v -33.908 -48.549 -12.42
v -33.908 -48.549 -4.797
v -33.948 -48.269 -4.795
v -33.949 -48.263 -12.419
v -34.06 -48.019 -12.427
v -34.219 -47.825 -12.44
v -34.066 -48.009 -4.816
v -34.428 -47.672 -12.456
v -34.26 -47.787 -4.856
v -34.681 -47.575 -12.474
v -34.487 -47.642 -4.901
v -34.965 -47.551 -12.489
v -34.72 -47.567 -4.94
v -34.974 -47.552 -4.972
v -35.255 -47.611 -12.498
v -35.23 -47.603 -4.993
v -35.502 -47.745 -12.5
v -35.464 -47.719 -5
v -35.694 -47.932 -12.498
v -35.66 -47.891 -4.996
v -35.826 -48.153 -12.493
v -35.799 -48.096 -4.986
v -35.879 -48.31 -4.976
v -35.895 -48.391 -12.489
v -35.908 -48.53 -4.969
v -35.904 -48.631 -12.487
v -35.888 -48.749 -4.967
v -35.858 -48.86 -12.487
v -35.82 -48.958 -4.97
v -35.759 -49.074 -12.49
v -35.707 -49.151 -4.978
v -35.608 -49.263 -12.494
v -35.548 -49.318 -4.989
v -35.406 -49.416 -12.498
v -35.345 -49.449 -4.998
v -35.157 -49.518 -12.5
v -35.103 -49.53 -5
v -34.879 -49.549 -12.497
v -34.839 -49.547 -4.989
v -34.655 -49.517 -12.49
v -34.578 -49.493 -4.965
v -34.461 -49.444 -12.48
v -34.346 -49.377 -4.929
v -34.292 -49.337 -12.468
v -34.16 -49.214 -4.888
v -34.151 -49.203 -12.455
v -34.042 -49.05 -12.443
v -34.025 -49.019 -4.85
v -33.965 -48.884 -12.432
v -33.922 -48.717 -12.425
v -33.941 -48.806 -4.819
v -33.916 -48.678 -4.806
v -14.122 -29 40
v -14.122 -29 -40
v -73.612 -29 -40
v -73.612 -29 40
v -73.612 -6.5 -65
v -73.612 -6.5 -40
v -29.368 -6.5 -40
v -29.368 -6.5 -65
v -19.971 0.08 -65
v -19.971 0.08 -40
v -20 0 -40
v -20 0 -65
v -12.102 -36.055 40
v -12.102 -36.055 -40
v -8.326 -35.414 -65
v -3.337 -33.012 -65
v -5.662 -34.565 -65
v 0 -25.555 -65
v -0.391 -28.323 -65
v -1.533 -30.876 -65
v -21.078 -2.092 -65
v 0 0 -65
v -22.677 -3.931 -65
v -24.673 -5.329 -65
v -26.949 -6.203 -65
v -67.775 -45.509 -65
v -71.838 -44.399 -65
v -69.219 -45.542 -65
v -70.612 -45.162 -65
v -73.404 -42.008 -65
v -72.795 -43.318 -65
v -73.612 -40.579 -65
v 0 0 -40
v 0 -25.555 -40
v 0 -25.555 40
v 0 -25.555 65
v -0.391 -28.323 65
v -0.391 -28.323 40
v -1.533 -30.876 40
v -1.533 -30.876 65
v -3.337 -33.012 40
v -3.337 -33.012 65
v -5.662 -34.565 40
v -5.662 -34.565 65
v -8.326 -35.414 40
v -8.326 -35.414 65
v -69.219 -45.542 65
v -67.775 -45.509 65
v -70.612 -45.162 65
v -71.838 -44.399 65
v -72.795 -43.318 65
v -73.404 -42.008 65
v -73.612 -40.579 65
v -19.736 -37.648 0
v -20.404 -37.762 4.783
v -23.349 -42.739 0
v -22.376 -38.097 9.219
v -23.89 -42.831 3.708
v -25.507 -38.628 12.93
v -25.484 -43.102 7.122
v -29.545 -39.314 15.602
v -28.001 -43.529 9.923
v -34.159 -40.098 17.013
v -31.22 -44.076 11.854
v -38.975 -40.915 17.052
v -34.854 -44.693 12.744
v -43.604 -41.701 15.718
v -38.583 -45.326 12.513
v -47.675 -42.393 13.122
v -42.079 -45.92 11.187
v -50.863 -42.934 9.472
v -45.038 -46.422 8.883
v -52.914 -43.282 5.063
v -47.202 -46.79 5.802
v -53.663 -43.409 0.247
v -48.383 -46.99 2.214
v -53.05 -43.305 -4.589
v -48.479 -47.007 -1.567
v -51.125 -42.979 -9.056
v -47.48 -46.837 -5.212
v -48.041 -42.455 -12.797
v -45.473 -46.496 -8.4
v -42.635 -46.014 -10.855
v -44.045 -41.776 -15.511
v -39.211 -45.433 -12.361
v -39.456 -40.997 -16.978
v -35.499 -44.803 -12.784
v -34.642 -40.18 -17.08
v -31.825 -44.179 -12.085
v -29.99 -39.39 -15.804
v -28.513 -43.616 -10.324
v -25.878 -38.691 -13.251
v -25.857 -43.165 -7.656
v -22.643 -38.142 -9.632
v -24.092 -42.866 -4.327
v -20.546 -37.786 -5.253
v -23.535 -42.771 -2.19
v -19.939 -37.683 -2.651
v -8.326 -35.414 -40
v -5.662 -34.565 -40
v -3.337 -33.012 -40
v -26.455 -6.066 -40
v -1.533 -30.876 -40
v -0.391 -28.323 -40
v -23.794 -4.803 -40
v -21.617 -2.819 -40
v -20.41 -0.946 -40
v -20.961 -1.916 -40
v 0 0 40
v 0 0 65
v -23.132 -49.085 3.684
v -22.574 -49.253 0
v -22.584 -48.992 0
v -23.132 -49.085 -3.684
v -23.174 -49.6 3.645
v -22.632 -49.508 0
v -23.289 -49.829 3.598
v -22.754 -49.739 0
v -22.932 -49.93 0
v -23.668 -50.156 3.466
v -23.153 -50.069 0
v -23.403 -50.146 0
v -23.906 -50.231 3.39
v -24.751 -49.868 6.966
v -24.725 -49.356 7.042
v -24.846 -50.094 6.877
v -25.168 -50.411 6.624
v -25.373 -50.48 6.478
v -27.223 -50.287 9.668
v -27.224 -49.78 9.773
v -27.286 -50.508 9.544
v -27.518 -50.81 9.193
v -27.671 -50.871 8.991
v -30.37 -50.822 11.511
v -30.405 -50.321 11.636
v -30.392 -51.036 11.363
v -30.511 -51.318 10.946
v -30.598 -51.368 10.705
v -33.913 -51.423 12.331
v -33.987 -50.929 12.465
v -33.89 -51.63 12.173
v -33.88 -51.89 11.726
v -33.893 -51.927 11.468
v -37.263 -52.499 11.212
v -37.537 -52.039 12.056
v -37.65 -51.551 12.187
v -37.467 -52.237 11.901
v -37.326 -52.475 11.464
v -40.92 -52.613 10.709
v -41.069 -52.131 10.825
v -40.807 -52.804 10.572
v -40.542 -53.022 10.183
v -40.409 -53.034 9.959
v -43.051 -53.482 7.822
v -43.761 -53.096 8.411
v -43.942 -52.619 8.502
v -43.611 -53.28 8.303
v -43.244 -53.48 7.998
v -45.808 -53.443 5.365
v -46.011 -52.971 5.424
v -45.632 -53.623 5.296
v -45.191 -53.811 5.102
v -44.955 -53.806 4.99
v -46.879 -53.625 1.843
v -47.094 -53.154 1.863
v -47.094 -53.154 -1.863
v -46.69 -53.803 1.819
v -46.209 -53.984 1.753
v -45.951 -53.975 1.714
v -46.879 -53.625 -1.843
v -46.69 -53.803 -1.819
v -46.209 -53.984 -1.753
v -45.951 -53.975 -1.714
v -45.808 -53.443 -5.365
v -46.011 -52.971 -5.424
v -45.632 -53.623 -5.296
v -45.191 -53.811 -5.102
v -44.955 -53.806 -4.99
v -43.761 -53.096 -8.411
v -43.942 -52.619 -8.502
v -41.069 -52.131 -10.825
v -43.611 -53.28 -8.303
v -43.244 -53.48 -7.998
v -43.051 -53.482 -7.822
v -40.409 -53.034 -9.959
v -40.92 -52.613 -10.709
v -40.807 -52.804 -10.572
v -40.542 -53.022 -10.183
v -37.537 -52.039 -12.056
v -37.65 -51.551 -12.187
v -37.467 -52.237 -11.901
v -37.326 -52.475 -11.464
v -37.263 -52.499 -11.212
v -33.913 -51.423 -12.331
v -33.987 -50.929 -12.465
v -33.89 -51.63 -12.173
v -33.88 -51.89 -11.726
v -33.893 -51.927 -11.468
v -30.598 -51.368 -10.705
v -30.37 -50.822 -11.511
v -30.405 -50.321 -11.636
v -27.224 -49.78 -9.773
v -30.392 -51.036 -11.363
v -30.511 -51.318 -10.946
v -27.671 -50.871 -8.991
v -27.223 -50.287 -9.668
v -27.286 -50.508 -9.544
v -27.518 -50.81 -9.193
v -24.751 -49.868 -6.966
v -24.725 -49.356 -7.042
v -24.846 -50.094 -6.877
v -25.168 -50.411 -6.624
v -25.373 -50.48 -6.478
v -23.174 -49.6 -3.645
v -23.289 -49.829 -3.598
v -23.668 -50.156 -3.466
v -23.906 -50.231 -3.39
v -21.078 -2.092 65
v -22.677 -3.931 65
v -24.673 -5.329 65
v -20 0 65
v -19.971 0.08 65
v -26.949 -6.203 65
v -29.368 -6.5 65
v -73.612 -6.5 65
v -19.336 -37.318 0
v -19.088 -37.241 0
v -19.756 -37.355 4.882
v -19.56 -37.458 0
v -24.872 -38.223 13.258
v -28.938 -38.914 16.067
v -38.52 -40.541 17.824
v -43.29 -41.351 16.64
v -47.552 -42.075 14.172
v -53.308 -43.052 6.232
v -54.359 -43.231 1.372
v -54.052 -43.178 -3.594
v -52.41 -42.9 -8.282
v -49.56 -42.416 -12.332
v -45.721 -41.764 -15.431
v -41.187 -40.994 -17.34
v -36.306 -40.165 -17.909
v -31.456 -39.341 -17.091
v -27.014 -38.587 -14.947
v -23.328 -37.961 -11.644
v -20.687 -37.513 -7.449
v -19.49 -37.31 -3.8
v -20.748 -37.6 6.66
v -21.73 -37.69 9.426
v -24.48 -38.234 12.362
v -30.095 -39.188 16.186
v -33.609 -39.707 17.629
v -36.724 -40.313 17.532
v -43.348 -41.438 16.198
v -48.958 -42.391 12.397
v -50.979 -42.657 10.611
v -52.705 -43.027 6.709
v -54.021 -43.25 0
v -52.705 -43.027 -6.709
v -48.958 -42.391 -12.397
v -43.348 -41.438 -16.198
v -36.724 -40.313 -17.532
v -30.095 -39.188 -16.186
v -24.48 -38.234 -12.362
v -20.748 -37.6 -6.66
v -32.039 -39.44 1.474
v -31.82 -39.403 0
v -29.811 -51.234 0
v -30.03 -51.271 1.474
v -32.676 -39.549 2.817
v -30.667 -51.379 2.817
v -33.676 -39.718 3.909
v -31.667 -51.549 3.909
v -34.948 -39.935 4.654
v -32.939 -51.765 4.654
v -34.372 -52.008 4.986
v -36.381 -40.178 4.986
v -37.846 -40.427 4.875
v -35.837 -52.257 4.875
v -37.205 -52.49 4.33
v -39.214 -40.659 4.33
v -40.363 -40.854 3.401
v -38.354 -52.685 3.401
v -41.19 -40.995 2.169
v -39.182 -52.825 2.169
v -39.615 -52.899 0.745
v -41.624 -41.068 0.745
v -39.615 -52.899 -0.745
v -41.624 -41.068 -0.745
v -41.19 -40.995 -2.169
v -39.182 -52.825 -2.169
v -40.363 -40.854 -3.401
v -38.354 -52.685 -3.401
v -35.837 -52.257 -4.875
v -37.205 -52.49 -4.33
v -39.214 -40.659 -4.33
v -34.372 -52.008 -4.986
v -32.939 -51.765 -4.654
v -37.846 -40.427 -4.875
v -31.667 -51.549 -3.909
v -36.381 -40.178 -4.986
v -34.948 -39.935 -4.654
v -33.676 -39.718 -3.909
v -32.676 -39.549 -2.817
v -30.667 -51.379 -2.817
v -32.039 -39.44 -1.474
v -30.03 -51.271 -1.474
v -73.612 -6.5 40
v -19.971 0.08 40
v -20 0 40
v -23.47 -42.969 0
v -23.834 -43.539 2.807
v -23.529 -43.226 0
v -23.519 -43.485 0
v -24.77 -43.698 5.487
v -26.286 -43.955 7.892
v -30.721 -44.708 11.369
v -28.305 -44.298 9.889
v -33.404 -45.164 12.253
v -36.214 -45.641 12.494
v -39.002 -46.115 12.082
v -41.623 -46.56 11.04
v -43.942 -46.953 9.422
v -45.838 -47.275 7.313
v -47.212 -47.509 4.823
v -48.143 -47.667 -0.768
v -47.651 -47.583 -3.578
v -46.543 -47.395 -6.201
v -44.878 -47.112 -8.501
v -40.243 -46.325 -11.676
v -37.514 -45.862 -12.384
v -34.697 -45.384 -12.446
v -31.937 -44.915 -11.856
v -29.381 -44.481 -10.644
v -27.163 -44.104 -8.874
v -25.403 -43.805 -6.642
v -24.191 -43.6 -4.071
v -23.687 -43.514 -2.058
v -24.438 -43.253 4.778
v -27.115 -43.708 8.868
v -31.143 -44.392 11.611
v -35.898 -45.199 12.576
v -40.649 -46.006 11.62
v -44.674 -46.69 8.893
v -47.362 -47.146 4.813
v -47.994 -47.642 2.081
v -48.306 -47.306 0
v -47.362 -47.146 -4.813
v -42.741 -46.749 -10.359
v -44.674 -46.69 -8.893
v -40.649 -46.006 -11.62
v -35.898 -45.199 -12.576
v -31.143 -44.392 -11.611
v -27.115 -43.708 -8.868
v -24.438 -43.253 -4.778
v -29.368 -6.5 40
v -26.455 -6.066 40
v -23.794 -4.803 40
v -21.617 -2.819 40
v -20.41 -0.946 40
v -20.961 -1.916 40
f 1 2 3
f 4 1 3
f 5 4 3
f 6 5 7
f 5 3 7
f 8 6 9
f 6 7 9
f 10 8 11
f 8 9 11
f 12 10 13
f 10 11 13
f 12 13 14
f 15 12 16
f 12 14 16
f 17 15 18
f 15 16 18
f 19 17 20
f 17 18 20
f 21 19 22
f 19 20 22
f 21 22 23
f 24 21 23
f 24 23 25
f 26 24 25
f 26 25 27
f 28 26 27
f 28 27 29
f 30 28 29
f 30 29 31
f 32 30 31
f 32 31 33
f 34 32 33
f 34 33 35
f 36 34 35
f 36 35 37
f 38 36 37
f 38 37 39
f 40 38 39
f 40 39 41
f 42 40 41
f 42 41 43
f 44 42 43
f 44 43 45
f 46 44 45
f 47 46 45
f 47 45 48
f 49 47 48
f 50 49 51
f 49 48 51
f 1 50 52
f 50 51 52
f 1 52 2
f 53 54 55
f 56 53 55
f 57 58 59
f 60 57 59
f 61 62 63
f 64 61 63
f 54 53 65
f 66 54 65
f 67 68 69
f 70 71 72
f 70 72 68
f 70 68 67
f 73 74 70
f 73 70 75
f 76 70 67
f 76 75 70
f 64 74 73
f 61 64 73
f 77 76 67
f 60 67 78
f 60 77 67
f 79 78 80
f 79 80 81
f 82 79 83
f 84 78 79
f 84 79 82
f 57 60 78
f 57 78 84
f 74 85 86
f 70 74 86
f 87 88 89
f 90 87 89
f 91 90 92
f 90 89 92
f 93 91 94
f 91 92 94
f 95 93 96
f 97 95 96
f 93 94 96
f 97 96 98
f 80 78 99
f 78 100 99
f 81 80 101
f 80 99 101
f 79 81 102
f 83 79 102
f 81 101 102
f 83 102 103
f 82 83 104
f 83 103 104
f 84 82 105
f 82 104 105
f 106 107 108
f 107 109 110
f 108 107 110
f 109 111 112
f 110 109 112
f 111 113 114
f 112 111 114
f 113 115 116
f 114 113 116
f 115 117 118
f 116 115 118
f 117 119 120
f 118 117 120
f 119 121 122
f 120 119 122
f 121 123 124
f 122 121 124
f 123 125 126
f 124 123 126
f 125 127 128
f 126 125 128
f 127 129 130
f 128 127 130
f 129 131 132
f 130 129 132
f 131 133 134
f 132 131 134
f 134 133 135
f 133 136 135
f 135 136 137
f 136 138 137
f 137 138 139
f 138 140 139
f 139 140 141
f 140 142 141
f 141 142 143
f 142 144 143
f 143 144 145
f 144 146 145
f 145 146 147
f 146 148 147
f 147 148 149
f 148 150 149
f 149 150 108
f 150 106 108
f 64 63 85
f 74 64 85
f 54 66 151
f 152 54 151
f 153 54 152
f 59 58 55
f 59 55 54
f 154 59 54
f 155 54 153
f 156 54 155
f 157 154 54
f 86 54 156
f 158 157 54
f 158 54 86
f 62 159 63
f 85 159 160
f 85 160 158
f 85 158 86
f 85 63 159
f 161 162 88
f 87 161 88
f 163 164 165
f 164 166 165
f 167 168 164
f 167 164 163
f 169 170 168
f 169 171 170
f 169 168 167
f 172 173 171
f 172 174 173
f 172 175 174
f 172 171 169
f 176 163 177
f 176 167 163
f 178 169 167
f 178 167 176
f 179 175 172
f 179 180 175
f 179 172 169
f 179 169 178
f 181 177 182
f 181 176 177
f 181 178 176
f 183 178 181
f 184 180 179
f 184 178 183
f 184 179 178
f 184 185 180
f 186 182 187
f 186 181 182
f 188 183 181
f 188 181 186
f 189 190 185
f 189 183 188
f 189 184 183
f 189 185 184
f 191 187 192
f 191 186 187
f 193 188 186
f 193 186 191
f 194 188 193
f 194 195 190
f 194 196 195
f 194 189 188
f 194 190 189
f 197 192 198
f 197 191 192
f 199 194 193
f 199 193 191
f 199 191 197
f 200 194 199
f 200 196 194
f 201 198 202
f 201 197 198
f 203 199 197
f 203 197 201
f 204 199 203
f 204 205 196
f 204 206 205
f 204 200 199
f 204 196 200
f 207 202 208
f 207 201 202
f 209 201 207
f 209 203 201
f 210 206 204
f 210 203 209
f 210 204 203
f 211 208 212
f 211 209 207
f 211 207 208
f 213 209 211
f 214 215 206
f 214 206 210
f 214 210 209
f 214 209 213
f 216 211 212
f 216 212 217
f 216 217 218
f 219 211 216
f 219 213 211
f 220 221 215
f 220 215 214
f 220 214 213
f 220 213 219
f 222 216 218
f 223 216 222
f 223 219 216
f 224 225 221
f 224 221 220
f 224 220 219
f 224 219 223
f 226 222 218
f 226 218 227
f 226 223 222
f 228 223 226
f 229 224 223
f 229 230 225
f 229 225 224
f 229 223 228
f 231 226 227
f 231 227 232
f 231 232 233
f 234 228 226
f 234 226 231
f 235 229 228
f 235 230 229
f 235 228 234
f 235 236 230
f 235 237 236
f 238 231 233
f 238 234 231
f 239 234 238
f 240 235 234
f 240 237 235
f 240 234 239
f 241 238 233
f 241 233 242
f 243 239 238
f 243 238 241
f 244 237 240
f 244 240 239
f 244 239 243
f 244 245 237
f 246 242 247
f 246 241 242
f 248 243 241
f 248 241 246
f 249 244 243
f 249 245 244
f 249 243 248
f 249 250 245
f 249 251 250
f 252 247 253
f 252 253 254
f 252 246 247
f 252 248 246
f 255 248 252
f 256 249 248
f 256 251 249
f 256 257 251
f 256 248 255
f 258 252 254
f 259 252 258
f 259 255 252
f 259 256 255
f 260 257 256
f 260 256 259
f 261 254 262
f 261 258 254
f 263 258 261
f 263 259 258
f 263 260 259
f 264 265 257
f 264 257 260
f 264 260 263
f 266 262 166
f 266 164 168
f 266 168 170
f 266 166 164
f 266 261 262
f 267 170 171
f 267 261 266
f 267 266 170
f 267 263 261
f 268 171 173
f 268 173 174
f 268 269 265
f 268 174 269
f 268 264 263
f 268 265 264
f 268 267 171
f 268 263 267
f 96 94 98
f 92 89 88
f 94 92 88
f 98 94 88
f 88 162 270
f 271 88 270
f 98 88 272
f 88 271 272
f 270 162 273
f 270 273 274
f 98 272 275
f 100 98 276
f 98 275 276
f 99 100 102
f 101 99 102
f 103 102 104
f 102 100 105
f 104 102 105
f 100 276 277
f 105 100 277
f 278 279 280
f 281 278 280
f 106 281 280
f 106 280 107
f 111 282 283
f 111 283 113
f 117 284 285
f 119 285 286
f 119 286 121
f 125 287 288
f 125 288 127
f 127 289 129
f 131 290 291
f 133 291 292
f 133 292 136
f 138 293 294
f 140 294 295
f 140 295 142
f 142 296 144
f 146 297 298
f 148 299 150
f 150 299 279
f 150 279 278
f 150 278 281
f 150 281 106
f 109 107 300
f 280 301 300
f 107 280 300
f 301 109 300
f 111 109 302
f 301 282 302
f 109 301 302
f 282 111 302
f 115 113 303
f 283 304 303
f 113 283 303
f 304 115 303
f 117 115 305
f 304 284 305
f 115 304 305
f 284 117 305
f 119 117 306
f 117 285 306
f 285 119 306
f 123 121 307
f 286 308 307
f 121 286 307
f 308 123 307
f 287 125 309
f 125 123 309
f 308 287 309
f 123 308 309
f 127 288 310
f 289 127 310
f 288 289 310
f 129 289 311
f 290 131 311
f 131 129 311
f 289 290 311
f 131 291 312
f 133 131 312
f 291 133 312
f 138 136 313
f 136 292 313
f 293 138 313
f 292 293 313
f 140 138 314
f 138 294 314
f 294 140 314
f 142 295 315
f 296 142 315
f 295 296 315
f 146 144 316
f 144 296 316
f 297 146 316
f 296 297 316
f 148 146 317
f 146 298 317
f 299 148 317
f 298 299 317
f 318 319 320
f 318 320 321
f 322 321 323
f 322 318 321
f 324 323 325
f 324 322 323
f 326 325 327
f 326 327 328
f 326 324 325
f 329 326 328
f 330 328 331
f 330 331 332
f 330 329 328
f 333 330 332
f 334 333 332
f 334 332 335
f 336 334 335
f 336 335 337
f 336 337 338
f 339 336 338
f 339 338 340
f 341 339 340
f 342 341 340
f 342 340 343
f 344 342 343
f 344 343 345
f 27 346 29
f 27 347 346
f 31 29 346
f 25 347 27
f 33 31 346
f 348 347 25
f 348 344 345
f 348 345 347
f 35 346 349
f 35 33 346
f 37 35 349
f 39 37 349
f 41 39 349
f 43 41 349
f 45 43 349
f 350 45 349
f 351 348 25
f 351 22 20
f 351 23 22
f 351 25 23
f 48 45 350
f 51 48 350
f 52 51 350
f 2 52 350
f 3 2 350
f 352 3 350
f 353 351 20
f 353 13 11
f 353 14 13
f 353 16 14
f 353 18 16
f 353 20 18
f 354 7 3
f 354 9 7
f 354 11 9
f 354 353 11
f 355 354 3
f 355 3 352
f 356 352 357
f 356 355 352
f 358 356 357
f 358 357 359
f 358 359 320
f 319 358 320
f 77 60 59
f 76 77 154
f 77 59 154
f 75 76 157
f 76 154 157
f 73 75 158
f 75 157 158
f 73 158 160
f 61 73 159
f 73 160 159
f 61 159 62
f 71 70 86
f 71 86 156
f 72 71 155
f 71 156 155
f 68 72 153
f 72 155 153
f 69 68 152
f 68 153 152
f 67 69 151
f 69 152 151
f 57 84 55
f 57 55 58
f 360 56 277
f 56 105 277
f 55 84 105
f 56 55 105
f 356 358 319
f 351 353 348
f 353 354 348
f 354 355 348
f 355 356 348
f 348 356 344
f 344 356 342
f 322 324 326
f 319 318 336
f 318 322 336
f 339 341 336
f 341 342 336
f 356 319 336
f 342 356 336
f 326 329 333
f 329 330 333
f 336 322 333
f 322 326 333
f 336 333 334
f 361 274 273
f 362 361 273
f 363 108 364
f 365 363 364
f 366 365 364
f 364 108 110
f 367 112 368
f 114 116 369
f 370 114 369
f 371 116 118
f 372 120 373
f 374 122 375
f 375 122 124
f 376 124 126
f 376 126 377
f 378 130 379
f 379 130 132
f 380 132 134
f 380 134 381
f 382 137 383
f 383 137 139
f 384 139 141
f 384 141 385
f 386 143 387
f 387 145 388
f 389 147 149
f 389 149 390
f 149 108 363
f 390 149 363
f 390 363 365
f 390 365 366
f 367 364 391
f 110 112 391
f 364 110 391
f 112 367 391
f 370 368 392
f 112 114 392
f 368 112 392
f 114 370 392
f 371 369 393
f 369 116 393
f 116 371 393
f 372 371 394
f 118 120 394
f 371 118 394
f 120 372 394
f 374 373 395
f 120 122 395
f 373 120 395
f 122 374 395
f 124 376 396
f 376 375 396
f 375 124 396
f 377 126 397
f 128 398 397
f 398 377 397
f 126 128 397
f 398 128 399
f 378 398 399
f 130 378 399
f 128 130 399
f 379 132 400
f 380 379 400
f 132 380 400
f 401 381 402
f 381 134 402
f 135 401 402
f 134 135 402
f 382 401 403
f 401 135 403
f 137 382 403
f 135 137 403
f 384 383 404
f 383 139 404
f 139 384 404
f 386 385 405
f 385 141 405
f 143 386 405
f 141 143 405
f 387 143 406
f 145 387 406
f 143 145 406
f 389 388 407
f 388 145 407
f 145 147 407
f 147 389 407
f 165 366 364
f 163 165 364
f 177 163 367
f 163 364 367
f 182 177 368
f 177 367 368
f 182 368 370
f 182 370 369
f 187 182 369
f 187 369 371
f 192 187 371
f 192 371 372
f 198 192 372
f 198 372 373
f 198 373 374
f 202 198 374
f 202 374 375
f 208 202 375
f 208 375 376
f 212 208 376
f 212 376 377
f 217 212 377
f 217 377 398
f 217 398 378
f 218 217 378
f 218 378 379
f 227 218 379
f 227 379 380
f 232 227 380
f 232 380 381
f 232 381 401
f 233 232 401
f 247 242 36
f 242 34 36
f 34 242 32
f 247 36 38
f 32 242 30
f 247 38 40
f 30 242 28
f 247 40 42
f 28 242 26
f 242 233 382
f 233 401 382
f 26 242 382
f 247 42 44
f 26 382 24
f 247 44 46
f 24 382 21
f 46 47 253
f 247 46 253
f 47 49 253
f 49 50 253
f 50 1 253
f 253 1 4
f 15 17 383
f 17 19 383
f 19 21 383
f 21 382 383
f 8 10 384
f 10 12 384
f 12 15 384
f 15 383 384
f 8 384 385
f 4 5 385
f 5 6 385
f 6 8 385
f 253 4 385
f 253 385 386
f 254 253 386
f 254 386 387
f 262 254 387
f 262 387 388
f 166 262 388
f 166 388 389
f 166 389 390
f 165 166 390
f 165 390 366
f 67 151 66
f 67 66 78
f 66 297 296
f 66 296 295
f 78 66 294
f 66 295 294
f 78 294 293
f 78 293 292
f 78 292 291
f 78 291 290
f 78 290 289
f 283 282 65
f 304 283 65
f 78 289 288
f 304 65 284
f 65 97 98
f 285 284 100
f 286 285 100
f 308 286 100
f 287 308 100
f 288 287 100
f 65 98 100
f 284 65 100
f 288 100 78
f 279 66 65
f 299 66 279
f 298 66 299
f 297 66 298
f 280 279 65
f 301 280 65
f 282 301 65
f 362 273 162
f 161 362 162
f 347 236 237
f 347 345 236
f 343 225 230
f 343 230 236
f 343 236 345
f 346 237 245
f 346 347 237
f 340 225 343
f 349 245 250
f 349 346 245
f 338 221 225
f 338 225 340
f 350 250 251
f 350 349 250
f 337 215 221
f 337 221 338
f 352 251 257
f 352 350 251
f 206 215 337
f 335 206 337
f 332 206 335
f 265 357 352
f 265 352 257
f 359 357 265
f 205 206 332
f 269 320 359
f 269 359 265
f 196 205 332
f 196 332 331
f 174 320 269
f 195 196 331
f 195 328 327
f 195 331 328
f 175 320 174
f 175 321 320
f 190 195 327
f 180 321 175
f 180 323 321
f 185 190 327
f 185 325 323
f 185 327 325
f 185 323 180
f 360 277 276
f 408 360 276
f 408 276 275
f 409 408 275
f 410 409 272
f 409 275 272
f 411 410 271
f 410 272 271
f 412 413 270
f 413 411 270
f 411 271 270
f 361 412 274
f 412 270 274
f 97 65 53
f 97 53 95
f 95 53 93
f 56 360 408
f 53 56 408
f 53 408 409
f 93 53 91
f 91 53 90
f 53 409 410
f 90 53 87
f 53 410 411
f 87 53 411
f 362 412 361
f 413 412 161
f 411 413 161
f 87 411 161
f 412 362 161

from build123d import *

# Parameters (mm, degrees)
BOSS_EXTRUDE1_DEPTH = 65
CUT_EXTRUDE1_DEPTH  = 40
CUT_EXTRUDE4_DEPTH  = 22.5
SKETCH6_R           = 12.5
SKETCH6_R_2         = 5
BOSS_EXTRUDE2_DEPTH = 12
CHAMFER1_SIZE       = 5
FILLET1_R           = 1
SKETCH7_R           = 1
CUT_EXTRUDE5_DEPTH  = 66


with BuildPart() as part:
    # Sketch1 → Boss-Extrude1 (new body, symmetric)
    with BuildSketch(Plane.XY):
        with BuildLine():
            Line((0, 0), (0, -25.554938316))
            ThreePointArc((0, -25.554938316), (-2.359933303, -32.007021768), (-8.325876175, -35.413807897))
            Line((-8.325876175, -35.413807897), (-67.775097409, -45.508814922))
            ThreePointArc((-67.775097409, -45.508814922), (-71.838201048, -44.399413479), (-73.612159322, -40.579380131))
            Line((-73.612159322, -40.579380131), (-73.612159322, -6.5))
            Line((-73.612159322, -6.5), (-29.367881905, -6.5))
            ThreePointArc((-29.367881905, -6.5), (-23.632117541, -4.691520443), (-19.970955697, 0.079798567))
            Line((-19.970955697, 0.079798567), (-20, 0))
            Line((-20, 0), (0, 0))
        make_face()
    extrude(amount=BOSS_EXTRUDE1_DEPTH, both=True)

    # Sketch2 → Cut-Extrude1 (cut, symmetric)
    with BuildSketch(Plane.XY):
        with BuildLine():
            Line((-20, 0), (-19.970955697, 0.079798567))
            ThreePointArc((-19.970955697, 0.079798567), (-20.672372291, -1.438432196), (-21.617003148, -2.818534521))
            Line((-21.617003148, -2.818534521), (-12.102051753, -36.055036129))
            Line((-12.102051753, -36.055036129), (-8.325876175, -35.413807897))
            ThreePointArc((-8.325876175, -35.413807897), (-2.359933303, -32.007021768), (0, -25.554938316))
            Line((0, -25.554938316), (0, 0))
            Line((0, 0), (-20, 0))
        make_face()
    extrude(amount=CUT_EXTRUDE1_DEPTH, both=True, mode=Mode.SUBTRACT)

    # Sketch5 → Cut-Extrude4 (cut, symmetric)
    with BuildSketch(Plane(origin=(0, -6.5, 0), x_dir=(1, 0, 0), z_dir=(0, 1, 0))):
        Polygon((-73.612159322, 40), (-29.401702386, 40), (0, 40), (0, -40), (-29.367881905, -40), (-73.612159322, -40), align=None)
    extrude(amount=CUT_EXTRUDE4_DEPTH, both=True, mode=Mode.SUBTRACT)

    # Sketch6 → Boss-Extrude2 (add)
    with BuildSketch(Plane(origin=(5.611689276, -33.047085202, 0), x_dir=(0.985886958, 0.167412383, 0), z_dir=(0.167412383, -0.985886958, 0))):
        with Locations((-42.967314491, 0)):
            Circle(SKETCH6_R)
        with Locations((-42.967314491, 0)):
            Circle(SKETCH6_R_2, mode=Mode.SUBTRACT)
    extrude(amount=BOSS_EXTRUDE2_DEPTH)

    # Chamfer1
    chamfer1_edges = [part.edges().sort_by_distance(p)[0] for p in [
        (-49.072812682, -42.333000474, 0),
    ]]
    chamfer(chamfer1_edges, length=CHAMFER1_SIZE)

    # Fillet1
    fillet1_edges = [part.edges().sort_by_distance(p)[0] for p in [
        (-54.002247473, -43.170062387, 0),
        (-47.063864092, -54.163643971, 0),
        (-48.23575077, -47.262435265, 0),
    ]]
    fillet(fillet1_edges, radius=FILLET1_R)

    # Sketch7 → Cut-Extrude5 (cut, through all)
    with BuildSketch(Plane.XY):
        with Locations((-34.907689498, -48.549314554)):
            Circle(SKETCH7_R)
    extrude(amount=-CUT_EXTRUDE5_DEPTH, mode=Mode.SUBTRACT)


solid = part.part
